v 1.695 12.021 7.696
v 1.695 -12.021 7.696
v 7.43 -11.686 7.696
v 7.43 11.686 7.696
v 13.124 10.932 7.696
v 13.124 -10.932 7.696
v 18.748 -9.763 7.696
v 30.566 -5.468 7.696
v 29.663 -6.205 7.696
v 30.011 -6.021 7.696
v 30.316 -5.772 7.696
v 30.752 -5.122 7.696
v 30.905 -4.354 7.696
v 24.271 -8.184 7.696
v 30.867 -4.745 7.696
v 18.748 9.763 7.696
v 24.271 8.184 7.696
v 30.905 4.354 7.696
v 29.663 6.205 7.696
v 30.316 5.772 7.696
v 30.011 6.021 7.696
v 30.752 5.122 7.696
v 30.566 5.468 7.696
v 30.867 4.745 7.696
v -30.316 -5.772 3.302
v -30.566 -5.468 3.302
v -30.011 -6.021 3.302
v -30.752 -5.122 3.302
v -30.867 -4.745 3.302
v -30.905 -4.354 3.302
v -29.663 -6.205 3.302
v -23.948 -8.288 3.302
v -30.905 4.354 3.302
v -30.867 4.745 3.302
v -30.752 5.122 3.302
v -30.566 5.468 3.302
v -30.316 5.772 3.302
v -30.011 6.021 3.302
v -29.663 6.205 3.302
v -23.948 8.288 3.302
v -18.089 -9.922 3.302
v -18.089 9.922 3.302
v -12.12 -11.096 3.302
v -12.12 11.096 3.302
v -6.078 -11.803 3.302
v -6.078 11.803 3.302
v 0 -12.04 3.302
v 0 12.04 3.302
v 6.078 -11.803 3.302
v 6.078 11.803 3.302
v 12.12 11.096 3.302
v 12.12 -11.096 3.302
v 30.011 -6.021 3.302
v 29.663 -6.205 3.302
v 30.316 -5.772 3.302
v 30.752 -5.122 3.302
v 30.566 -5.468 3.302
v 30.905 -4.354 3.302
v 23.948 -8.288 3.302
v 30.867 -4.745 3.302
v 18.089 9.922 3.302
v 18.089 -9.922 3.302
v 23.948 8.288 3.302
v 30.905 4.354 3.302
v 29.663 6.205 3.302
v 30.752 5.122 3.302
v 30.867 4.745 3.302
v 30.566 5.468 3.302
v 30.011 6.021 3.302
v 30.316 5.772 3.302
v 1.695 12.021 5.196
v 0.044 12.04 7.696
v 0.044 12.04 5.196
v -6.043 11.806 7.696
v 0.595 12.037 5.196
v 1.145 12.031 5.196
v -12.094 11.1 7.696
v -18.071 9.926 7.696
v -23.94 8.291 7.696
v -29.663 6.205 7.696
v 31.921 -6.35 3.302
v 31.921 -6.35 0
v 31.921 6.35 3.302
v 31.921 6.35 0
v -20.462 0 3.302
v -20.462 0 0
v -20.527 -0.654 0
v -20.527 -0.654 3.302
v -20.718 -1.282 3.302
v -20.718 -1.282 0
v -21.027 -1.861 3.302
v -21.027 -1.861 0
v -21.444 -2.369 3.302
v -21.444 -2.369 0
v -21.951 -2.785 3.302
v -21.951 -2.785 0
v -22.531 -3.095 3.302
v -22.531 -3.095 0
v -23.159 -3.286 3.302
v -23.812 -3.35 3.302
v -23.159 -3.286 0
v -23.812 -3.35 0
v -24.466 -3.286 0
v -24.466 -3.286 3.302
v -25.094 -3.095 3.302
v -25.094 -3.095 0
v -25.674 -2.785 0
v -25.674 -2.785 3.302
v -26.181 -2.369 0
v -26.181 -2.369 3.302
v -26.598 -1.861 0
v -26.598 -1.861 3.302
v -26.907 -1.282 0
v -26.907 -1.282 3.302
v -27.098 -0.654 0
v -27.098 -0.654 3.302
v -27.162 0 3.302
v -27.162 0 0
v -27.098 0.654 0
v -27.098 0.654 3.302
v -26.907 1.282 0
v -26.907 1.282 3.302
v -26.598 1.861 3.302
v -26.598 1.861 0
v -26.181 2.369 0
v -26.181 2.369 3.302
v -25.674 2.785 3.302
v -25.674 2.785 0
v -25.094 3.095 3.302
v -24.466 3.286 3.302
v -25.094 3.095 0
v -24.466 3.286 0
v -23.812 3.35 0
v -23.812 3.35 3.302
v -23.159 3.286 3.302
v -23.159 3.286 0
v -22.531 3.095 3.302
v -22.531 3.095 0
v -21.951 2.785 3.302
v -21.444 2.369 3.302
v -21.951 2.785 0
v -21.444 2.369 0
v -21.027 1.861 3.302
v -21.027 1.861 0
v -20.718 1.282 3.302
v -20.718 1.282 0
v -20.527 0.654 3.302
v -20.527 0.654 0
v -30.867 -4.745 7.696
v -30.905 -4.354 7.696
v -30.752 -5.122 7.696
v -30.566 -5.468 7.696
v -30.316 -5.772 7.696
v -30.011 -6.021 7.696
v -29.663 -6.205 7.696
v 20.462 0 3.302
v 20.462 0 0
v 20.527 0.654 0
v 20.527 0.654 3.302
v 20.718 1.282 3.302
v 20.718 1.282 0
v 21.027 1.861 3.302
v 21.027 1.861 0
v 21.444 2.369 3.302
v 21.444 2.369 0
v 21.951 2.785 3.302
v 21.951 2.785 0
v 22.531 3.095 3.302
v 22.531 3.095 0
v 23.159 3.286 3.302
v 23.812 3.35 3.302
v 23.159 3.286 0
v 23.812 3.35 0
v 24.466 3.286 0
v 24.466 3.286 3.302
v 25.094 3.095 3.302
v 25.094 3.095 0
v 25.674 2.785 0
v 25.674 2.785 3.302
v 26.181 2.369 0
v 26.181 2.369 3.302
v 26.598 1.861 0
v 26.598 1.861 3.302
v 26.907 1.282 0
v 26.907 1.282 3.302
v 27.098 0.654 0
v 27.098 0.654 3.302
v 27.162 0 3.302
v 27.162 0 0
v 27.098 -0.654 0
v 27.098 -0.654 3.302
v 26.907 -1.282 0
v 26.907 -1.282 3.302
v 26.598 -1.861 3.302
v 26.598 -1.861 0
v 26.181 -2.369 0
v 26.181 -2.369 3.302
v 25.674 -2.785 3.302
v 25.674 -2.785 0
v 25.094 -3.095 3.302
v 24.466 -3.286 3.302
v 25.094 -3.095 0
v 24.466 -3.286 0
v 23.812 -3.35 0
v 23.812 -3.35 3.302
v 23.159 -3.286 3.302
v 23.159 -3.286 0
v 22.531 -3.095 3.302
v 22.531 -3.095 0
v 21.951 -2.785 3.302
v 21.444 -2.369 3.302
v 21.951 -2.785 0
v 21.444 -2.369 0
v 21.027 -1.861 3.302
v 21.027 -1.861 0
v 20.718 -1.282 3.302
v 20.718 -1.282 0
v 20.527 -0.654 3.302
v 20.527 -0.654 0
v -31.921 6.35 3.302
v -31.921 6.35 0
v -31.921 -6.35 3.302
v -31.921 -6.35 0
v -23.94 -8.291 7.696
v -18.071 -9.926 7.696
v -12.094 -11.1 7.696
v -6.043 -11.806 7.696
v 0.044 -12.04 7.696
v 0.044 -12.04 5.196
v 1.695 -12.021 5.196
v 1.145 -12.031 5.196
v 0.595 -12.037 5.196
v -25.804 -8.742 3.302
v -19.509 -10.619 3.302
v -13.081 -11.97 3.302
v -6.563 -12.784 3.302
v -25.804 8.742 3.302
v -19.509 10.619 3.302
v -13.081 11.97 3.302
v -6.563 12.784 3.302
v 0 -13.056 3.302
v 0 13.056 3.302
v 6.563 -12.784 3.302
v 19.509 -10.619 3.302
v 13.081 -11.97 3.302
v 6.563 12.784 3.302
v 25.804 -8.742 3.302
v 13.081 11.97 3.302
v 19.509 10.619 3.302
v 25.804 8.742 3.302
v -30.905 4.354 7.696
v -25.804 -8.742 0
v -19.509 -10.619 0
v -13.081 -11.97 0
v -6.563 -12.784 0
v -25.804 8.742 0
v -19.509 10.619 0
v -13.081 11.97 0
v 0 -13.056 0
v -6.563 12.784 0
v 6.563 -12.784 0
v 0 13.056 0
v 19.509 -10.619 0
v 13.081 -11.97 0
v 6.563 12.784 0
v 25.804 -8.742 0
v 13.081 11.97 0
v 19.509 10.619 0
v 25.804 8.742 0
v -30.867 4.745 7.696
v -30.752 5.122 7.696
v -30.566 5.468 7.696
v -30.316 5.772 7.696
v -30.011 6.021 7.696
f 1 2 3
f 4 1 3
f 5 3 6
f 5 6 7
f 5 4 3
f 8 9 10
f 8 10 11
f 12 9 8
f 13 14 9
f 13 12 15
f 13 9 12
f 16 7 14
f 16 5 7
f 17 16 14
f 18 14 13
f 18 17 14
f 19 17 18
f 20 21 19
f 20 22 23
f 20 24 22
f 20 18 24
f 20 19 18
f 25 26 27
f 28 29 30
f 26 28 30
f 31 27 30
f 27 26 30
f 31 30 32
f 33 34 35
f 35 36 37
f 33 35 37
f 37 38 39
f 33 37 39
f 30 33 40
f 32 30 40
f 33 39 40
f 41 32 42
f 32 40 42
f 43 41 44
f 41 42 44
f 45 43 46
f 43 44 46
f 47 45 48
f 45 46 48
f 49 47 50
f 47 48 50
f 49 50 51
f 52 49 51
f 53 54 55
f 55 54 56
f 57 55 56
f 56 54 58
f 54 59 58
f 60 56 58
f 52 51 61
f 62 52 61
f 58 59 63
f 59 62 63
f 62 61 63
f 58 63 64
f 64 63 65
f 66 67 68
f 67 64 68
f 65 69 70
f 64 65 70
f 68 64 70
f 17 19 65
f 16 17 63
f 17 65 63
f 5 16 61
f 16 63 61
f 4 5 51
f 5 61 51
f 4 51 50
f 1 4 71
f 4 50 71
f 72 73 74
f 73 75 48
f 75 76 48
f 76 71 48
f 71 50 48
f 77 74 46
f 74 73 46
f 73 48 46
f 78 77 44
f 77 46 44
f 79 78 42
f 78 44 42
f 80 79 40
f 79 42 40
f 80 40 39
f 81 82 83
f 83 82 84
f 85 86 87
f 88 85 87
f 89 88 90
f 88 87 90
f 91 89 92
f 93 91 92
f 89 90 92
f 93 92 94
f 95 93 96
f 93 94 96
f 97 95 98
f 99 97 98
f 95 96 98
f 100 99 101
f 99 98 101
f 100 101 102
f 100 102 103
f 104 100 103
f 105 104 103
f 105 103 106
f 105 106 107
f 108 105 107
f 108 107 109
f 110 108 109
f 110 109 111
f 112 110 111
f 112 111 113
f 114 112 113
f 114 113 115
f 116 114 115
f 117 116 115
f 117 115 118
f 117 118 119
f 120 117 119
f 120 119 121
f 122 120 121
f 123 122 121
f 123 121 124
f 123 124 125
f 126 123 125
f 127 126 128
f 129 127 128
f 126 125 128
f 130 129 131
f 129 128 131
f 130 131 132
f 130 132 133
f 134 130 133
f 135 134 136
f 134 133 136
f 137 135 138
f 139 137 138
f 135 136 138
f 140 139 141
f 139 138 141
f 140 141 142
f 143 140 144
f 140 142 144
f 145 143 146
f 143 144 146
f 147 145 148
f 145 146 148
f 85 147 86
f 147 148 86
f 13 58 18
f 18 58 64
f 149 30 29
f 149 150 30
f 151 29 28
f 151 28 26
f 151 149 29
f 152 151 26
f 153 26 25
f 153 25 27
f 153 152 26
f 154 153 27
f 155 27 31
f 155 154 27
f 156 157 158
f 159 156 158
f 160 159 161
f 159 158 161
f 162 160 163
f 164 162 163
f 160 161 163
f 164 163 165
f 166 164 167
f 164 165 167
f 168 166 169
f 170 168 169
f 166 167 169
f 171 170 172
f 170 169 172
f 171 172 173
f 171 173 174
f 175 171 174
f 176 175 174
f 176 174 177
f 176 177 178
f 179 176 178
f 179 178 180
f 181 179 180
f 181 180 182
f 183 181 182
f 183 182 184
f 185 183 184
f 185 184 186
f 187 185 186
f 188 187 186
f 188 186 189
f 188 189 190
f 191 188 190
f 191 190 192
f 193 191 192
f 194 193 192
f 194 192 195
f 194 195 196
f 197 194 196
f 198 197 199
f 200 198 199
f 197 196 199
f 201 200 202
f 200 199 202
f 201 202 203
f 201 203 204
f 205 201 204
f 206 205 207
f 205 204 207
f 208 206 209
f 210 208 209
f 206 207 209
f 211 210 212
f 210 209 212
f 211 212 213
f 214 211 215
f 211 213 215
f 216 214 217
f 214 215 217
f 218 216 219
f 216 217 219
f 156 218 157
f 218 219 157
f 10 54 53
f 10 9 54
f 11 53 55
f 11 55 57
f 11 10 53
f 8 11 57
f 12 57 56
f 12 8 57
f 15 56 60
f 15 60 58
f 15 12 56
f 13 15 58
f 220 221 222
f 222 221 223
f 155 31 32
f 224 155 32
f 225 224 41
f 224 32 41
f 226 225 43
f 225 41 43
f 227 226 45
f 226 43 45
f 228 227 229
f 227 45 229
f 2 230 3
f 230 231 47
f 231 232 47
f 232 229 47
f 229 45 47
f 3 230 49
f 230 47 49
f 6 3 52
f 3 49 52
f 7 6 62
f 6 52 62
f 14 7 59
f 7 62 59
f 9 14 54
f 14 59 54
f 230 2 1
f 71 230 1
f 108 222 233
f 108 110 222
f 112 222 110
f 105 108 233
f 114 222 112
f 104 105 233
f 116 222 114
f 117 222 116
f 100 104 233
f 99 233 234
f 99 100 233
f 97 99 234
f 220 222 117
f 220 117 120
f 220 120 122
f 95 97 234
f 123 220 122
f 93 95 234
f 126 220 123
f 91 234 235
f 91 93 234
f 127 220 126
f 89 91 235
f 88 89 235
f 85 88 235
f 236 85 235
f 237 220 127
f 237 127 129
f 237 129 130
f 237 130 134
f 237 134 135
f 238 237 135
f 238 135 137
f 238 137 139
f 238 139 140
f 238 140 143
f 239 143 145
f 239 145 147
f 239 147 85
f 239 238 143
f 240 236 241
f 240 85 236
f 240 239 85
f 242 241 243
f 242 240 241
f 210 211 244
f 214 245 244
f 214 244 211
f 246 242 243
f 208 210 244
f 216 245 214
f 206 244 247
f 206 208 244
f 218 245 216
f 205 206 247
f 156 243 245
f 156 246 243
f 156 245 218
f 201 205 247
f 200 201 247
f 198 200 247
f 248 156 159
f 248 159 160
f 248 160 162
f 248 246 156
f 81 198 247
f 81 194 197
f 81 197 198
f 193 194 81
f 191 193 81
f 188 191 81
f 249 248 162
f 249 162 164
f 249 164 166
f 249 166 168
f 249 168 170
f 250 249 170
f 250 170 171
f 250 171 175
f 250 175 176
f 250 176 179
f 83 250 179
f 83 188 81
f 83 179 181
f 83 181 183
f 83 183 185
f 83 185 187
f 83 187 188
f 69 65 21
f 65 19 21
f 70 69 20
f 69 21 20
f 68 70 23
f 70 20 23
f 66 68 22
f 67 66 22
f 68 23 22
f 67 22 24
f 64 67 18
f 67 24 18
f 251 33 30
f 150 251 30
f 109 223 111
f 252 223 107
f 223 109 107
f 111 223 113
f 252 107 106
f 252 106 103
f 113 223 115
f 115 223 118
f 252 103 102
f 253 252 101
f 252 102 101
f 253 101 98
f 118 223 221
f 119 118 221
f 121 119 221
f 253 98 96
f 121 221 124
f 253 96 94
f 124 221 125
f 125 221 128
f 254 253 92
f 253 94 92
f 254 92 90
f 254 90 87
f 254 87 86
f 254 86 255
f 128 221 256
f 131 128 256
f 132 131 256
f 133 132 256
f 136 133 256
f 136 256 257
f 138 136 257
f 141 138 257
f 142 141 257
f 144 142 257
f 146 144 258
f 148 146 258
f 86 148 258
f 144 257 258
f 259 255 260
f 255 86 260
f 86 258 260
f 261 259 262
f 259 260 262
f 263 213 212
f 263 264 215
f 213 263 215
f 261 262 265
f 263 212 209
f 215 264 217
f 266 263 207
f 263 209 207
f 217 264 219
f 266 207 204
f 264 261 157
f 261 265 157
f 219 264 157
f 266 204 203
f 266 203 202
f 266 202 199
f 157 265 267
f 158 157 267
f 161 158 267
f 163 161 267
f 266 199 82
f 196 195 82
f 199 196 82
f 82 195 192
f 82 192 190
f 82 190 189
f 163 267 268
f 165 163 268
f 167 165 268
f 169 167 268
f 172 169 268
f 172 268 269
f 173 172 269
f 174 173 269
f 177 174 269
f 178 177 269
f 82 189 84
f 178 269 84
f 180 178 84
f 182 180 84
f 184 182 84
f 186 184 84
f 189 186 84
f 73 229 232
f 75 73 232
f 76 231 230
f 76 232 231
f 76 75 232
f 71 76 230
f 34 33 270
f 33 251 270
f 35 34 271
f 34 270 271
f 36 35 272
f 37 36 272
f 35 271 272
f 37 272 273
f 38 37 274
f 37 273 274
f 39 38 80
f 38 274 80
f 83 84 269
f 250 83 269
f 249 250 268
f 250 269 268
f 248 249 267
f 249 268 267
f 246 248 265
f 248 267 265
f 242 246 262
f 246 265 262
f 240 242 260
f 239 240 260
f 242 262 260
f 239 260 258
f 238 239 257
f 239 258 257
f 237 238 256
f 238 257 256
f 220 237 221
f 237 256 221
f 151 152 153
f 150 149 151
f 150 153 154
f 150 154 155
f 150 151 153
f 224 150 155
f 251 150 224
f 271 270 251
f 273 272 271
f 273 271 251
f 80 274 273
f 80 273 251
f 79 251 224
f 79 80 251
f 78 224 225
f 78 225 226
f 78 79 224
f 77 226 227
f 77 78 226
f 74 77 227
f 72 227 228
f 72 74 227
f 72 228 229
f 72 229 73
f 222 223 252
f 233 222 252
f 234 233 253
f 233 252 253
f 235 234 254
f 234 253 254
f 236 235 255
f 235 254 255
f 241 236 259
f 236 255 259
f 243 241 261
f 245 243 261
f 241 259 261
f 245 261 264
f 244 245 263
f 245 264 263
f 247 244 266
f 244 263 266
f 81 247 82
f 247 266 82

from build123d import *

# Parameters (mm, degrees)
BOSS_EXTRUDE1_DEPTH = 3.302
BOSS_EXTRUDE2_DEPTH = 4.3942
SKETCH3_R           = 3.35
CUT_EXTRUDE1_DEPTH  = 6.35
SKETCH6_W           = 1.651
SKETCH6_H           = 37.625569531
CUT_EXTRUDE2_DEPTH  = 2.5
FILLET1_R           = 2


with BuildPart() as part:
    # Sketch1 → Boss-Extrude1 (new body)
    with BuildSketch(Plane.XY):
        with BuildLine():
            Line((-31.92145, 6.35), (-31.92145, -6.35))
            ThreePointArc((-31.92145, -6.35), (0, -13.0556), (31.92145, -6.35))
            Line((31.92145, -6.35), (31.92145, 6.35))
            ThreePointArc((31.92145, 6.35), (0, 13.0556), (-31.92145, 6.35))
        make_face()
    extrude(amount=BOSS_EXTRUDE1_DEPTH)

    # Sketch3 → Cut-Extrude1 (cut)
    with BuildSketch(Plane(origin=(0, 0, 0), x_dir=(-1, 0, 0), z_dir=(0, 0, -1))):
        with Locations((-23.8125, 0)):
            Circle(SKETCH3_R)
        with Locations(Location((23.8125, 0, 0), (0, 0, 180))):
            Circle(SKETCH3_R)
    extrude(amount=-CUT_EXTRUDE1_DEPTH, mode=Mode.SUBTRACT)


with BuildPart() as body_2:
    # Sketch2 → Boss-Extrude2 (new body)
    with BuildSketch(Plane.XY.offset(3.302)):
        with BuildLine():
            Line((-30.90545, 5.683695808), (-30.90545, -5.683695808))
            ThreePointArc((-30.90545, -5.683695808), (0, -12.0396), (30.90545, -5.683695808))
            Line((30.90545, -5.683695808), (30.90545, 5.683695808))
            ThreePointArc((30.90545, 5.683695808), (0, 12.0396), (-30.90545, 5.683695808))
        make_face()
    extrude(amount=BOSS_EXTRUDE2_DEPTH)

    # Sketch6 → Cut-Extrude2 (cut)
    with BuildSketch(Plane.XY.offset(7.6962)):
        with Locations((0.86995, -0.296005355)):
            Rectangle(SKETCH6_W, SKETCH6_H)
    extrude(amount=-CUT_EXTRUDE2_DEPTH, mode=Mode.SUBTRACT)

    # Fillet1
    fillet1_edges = [body_2.edges().sort_by_distance(p)[0] for p in [
        (30.90545, 5.683695808, 5.4991),
        (30.90545, -5.683695808, 5.4991),
        (-30.90545, -5.683695808, 5.4991),
        (-30.90545, 5.683695808, 5.4991),
    ]]
    fillet(fillet1_edges, radius=FILLET1_R)


solid = Compound([part.part, body_2.part])
